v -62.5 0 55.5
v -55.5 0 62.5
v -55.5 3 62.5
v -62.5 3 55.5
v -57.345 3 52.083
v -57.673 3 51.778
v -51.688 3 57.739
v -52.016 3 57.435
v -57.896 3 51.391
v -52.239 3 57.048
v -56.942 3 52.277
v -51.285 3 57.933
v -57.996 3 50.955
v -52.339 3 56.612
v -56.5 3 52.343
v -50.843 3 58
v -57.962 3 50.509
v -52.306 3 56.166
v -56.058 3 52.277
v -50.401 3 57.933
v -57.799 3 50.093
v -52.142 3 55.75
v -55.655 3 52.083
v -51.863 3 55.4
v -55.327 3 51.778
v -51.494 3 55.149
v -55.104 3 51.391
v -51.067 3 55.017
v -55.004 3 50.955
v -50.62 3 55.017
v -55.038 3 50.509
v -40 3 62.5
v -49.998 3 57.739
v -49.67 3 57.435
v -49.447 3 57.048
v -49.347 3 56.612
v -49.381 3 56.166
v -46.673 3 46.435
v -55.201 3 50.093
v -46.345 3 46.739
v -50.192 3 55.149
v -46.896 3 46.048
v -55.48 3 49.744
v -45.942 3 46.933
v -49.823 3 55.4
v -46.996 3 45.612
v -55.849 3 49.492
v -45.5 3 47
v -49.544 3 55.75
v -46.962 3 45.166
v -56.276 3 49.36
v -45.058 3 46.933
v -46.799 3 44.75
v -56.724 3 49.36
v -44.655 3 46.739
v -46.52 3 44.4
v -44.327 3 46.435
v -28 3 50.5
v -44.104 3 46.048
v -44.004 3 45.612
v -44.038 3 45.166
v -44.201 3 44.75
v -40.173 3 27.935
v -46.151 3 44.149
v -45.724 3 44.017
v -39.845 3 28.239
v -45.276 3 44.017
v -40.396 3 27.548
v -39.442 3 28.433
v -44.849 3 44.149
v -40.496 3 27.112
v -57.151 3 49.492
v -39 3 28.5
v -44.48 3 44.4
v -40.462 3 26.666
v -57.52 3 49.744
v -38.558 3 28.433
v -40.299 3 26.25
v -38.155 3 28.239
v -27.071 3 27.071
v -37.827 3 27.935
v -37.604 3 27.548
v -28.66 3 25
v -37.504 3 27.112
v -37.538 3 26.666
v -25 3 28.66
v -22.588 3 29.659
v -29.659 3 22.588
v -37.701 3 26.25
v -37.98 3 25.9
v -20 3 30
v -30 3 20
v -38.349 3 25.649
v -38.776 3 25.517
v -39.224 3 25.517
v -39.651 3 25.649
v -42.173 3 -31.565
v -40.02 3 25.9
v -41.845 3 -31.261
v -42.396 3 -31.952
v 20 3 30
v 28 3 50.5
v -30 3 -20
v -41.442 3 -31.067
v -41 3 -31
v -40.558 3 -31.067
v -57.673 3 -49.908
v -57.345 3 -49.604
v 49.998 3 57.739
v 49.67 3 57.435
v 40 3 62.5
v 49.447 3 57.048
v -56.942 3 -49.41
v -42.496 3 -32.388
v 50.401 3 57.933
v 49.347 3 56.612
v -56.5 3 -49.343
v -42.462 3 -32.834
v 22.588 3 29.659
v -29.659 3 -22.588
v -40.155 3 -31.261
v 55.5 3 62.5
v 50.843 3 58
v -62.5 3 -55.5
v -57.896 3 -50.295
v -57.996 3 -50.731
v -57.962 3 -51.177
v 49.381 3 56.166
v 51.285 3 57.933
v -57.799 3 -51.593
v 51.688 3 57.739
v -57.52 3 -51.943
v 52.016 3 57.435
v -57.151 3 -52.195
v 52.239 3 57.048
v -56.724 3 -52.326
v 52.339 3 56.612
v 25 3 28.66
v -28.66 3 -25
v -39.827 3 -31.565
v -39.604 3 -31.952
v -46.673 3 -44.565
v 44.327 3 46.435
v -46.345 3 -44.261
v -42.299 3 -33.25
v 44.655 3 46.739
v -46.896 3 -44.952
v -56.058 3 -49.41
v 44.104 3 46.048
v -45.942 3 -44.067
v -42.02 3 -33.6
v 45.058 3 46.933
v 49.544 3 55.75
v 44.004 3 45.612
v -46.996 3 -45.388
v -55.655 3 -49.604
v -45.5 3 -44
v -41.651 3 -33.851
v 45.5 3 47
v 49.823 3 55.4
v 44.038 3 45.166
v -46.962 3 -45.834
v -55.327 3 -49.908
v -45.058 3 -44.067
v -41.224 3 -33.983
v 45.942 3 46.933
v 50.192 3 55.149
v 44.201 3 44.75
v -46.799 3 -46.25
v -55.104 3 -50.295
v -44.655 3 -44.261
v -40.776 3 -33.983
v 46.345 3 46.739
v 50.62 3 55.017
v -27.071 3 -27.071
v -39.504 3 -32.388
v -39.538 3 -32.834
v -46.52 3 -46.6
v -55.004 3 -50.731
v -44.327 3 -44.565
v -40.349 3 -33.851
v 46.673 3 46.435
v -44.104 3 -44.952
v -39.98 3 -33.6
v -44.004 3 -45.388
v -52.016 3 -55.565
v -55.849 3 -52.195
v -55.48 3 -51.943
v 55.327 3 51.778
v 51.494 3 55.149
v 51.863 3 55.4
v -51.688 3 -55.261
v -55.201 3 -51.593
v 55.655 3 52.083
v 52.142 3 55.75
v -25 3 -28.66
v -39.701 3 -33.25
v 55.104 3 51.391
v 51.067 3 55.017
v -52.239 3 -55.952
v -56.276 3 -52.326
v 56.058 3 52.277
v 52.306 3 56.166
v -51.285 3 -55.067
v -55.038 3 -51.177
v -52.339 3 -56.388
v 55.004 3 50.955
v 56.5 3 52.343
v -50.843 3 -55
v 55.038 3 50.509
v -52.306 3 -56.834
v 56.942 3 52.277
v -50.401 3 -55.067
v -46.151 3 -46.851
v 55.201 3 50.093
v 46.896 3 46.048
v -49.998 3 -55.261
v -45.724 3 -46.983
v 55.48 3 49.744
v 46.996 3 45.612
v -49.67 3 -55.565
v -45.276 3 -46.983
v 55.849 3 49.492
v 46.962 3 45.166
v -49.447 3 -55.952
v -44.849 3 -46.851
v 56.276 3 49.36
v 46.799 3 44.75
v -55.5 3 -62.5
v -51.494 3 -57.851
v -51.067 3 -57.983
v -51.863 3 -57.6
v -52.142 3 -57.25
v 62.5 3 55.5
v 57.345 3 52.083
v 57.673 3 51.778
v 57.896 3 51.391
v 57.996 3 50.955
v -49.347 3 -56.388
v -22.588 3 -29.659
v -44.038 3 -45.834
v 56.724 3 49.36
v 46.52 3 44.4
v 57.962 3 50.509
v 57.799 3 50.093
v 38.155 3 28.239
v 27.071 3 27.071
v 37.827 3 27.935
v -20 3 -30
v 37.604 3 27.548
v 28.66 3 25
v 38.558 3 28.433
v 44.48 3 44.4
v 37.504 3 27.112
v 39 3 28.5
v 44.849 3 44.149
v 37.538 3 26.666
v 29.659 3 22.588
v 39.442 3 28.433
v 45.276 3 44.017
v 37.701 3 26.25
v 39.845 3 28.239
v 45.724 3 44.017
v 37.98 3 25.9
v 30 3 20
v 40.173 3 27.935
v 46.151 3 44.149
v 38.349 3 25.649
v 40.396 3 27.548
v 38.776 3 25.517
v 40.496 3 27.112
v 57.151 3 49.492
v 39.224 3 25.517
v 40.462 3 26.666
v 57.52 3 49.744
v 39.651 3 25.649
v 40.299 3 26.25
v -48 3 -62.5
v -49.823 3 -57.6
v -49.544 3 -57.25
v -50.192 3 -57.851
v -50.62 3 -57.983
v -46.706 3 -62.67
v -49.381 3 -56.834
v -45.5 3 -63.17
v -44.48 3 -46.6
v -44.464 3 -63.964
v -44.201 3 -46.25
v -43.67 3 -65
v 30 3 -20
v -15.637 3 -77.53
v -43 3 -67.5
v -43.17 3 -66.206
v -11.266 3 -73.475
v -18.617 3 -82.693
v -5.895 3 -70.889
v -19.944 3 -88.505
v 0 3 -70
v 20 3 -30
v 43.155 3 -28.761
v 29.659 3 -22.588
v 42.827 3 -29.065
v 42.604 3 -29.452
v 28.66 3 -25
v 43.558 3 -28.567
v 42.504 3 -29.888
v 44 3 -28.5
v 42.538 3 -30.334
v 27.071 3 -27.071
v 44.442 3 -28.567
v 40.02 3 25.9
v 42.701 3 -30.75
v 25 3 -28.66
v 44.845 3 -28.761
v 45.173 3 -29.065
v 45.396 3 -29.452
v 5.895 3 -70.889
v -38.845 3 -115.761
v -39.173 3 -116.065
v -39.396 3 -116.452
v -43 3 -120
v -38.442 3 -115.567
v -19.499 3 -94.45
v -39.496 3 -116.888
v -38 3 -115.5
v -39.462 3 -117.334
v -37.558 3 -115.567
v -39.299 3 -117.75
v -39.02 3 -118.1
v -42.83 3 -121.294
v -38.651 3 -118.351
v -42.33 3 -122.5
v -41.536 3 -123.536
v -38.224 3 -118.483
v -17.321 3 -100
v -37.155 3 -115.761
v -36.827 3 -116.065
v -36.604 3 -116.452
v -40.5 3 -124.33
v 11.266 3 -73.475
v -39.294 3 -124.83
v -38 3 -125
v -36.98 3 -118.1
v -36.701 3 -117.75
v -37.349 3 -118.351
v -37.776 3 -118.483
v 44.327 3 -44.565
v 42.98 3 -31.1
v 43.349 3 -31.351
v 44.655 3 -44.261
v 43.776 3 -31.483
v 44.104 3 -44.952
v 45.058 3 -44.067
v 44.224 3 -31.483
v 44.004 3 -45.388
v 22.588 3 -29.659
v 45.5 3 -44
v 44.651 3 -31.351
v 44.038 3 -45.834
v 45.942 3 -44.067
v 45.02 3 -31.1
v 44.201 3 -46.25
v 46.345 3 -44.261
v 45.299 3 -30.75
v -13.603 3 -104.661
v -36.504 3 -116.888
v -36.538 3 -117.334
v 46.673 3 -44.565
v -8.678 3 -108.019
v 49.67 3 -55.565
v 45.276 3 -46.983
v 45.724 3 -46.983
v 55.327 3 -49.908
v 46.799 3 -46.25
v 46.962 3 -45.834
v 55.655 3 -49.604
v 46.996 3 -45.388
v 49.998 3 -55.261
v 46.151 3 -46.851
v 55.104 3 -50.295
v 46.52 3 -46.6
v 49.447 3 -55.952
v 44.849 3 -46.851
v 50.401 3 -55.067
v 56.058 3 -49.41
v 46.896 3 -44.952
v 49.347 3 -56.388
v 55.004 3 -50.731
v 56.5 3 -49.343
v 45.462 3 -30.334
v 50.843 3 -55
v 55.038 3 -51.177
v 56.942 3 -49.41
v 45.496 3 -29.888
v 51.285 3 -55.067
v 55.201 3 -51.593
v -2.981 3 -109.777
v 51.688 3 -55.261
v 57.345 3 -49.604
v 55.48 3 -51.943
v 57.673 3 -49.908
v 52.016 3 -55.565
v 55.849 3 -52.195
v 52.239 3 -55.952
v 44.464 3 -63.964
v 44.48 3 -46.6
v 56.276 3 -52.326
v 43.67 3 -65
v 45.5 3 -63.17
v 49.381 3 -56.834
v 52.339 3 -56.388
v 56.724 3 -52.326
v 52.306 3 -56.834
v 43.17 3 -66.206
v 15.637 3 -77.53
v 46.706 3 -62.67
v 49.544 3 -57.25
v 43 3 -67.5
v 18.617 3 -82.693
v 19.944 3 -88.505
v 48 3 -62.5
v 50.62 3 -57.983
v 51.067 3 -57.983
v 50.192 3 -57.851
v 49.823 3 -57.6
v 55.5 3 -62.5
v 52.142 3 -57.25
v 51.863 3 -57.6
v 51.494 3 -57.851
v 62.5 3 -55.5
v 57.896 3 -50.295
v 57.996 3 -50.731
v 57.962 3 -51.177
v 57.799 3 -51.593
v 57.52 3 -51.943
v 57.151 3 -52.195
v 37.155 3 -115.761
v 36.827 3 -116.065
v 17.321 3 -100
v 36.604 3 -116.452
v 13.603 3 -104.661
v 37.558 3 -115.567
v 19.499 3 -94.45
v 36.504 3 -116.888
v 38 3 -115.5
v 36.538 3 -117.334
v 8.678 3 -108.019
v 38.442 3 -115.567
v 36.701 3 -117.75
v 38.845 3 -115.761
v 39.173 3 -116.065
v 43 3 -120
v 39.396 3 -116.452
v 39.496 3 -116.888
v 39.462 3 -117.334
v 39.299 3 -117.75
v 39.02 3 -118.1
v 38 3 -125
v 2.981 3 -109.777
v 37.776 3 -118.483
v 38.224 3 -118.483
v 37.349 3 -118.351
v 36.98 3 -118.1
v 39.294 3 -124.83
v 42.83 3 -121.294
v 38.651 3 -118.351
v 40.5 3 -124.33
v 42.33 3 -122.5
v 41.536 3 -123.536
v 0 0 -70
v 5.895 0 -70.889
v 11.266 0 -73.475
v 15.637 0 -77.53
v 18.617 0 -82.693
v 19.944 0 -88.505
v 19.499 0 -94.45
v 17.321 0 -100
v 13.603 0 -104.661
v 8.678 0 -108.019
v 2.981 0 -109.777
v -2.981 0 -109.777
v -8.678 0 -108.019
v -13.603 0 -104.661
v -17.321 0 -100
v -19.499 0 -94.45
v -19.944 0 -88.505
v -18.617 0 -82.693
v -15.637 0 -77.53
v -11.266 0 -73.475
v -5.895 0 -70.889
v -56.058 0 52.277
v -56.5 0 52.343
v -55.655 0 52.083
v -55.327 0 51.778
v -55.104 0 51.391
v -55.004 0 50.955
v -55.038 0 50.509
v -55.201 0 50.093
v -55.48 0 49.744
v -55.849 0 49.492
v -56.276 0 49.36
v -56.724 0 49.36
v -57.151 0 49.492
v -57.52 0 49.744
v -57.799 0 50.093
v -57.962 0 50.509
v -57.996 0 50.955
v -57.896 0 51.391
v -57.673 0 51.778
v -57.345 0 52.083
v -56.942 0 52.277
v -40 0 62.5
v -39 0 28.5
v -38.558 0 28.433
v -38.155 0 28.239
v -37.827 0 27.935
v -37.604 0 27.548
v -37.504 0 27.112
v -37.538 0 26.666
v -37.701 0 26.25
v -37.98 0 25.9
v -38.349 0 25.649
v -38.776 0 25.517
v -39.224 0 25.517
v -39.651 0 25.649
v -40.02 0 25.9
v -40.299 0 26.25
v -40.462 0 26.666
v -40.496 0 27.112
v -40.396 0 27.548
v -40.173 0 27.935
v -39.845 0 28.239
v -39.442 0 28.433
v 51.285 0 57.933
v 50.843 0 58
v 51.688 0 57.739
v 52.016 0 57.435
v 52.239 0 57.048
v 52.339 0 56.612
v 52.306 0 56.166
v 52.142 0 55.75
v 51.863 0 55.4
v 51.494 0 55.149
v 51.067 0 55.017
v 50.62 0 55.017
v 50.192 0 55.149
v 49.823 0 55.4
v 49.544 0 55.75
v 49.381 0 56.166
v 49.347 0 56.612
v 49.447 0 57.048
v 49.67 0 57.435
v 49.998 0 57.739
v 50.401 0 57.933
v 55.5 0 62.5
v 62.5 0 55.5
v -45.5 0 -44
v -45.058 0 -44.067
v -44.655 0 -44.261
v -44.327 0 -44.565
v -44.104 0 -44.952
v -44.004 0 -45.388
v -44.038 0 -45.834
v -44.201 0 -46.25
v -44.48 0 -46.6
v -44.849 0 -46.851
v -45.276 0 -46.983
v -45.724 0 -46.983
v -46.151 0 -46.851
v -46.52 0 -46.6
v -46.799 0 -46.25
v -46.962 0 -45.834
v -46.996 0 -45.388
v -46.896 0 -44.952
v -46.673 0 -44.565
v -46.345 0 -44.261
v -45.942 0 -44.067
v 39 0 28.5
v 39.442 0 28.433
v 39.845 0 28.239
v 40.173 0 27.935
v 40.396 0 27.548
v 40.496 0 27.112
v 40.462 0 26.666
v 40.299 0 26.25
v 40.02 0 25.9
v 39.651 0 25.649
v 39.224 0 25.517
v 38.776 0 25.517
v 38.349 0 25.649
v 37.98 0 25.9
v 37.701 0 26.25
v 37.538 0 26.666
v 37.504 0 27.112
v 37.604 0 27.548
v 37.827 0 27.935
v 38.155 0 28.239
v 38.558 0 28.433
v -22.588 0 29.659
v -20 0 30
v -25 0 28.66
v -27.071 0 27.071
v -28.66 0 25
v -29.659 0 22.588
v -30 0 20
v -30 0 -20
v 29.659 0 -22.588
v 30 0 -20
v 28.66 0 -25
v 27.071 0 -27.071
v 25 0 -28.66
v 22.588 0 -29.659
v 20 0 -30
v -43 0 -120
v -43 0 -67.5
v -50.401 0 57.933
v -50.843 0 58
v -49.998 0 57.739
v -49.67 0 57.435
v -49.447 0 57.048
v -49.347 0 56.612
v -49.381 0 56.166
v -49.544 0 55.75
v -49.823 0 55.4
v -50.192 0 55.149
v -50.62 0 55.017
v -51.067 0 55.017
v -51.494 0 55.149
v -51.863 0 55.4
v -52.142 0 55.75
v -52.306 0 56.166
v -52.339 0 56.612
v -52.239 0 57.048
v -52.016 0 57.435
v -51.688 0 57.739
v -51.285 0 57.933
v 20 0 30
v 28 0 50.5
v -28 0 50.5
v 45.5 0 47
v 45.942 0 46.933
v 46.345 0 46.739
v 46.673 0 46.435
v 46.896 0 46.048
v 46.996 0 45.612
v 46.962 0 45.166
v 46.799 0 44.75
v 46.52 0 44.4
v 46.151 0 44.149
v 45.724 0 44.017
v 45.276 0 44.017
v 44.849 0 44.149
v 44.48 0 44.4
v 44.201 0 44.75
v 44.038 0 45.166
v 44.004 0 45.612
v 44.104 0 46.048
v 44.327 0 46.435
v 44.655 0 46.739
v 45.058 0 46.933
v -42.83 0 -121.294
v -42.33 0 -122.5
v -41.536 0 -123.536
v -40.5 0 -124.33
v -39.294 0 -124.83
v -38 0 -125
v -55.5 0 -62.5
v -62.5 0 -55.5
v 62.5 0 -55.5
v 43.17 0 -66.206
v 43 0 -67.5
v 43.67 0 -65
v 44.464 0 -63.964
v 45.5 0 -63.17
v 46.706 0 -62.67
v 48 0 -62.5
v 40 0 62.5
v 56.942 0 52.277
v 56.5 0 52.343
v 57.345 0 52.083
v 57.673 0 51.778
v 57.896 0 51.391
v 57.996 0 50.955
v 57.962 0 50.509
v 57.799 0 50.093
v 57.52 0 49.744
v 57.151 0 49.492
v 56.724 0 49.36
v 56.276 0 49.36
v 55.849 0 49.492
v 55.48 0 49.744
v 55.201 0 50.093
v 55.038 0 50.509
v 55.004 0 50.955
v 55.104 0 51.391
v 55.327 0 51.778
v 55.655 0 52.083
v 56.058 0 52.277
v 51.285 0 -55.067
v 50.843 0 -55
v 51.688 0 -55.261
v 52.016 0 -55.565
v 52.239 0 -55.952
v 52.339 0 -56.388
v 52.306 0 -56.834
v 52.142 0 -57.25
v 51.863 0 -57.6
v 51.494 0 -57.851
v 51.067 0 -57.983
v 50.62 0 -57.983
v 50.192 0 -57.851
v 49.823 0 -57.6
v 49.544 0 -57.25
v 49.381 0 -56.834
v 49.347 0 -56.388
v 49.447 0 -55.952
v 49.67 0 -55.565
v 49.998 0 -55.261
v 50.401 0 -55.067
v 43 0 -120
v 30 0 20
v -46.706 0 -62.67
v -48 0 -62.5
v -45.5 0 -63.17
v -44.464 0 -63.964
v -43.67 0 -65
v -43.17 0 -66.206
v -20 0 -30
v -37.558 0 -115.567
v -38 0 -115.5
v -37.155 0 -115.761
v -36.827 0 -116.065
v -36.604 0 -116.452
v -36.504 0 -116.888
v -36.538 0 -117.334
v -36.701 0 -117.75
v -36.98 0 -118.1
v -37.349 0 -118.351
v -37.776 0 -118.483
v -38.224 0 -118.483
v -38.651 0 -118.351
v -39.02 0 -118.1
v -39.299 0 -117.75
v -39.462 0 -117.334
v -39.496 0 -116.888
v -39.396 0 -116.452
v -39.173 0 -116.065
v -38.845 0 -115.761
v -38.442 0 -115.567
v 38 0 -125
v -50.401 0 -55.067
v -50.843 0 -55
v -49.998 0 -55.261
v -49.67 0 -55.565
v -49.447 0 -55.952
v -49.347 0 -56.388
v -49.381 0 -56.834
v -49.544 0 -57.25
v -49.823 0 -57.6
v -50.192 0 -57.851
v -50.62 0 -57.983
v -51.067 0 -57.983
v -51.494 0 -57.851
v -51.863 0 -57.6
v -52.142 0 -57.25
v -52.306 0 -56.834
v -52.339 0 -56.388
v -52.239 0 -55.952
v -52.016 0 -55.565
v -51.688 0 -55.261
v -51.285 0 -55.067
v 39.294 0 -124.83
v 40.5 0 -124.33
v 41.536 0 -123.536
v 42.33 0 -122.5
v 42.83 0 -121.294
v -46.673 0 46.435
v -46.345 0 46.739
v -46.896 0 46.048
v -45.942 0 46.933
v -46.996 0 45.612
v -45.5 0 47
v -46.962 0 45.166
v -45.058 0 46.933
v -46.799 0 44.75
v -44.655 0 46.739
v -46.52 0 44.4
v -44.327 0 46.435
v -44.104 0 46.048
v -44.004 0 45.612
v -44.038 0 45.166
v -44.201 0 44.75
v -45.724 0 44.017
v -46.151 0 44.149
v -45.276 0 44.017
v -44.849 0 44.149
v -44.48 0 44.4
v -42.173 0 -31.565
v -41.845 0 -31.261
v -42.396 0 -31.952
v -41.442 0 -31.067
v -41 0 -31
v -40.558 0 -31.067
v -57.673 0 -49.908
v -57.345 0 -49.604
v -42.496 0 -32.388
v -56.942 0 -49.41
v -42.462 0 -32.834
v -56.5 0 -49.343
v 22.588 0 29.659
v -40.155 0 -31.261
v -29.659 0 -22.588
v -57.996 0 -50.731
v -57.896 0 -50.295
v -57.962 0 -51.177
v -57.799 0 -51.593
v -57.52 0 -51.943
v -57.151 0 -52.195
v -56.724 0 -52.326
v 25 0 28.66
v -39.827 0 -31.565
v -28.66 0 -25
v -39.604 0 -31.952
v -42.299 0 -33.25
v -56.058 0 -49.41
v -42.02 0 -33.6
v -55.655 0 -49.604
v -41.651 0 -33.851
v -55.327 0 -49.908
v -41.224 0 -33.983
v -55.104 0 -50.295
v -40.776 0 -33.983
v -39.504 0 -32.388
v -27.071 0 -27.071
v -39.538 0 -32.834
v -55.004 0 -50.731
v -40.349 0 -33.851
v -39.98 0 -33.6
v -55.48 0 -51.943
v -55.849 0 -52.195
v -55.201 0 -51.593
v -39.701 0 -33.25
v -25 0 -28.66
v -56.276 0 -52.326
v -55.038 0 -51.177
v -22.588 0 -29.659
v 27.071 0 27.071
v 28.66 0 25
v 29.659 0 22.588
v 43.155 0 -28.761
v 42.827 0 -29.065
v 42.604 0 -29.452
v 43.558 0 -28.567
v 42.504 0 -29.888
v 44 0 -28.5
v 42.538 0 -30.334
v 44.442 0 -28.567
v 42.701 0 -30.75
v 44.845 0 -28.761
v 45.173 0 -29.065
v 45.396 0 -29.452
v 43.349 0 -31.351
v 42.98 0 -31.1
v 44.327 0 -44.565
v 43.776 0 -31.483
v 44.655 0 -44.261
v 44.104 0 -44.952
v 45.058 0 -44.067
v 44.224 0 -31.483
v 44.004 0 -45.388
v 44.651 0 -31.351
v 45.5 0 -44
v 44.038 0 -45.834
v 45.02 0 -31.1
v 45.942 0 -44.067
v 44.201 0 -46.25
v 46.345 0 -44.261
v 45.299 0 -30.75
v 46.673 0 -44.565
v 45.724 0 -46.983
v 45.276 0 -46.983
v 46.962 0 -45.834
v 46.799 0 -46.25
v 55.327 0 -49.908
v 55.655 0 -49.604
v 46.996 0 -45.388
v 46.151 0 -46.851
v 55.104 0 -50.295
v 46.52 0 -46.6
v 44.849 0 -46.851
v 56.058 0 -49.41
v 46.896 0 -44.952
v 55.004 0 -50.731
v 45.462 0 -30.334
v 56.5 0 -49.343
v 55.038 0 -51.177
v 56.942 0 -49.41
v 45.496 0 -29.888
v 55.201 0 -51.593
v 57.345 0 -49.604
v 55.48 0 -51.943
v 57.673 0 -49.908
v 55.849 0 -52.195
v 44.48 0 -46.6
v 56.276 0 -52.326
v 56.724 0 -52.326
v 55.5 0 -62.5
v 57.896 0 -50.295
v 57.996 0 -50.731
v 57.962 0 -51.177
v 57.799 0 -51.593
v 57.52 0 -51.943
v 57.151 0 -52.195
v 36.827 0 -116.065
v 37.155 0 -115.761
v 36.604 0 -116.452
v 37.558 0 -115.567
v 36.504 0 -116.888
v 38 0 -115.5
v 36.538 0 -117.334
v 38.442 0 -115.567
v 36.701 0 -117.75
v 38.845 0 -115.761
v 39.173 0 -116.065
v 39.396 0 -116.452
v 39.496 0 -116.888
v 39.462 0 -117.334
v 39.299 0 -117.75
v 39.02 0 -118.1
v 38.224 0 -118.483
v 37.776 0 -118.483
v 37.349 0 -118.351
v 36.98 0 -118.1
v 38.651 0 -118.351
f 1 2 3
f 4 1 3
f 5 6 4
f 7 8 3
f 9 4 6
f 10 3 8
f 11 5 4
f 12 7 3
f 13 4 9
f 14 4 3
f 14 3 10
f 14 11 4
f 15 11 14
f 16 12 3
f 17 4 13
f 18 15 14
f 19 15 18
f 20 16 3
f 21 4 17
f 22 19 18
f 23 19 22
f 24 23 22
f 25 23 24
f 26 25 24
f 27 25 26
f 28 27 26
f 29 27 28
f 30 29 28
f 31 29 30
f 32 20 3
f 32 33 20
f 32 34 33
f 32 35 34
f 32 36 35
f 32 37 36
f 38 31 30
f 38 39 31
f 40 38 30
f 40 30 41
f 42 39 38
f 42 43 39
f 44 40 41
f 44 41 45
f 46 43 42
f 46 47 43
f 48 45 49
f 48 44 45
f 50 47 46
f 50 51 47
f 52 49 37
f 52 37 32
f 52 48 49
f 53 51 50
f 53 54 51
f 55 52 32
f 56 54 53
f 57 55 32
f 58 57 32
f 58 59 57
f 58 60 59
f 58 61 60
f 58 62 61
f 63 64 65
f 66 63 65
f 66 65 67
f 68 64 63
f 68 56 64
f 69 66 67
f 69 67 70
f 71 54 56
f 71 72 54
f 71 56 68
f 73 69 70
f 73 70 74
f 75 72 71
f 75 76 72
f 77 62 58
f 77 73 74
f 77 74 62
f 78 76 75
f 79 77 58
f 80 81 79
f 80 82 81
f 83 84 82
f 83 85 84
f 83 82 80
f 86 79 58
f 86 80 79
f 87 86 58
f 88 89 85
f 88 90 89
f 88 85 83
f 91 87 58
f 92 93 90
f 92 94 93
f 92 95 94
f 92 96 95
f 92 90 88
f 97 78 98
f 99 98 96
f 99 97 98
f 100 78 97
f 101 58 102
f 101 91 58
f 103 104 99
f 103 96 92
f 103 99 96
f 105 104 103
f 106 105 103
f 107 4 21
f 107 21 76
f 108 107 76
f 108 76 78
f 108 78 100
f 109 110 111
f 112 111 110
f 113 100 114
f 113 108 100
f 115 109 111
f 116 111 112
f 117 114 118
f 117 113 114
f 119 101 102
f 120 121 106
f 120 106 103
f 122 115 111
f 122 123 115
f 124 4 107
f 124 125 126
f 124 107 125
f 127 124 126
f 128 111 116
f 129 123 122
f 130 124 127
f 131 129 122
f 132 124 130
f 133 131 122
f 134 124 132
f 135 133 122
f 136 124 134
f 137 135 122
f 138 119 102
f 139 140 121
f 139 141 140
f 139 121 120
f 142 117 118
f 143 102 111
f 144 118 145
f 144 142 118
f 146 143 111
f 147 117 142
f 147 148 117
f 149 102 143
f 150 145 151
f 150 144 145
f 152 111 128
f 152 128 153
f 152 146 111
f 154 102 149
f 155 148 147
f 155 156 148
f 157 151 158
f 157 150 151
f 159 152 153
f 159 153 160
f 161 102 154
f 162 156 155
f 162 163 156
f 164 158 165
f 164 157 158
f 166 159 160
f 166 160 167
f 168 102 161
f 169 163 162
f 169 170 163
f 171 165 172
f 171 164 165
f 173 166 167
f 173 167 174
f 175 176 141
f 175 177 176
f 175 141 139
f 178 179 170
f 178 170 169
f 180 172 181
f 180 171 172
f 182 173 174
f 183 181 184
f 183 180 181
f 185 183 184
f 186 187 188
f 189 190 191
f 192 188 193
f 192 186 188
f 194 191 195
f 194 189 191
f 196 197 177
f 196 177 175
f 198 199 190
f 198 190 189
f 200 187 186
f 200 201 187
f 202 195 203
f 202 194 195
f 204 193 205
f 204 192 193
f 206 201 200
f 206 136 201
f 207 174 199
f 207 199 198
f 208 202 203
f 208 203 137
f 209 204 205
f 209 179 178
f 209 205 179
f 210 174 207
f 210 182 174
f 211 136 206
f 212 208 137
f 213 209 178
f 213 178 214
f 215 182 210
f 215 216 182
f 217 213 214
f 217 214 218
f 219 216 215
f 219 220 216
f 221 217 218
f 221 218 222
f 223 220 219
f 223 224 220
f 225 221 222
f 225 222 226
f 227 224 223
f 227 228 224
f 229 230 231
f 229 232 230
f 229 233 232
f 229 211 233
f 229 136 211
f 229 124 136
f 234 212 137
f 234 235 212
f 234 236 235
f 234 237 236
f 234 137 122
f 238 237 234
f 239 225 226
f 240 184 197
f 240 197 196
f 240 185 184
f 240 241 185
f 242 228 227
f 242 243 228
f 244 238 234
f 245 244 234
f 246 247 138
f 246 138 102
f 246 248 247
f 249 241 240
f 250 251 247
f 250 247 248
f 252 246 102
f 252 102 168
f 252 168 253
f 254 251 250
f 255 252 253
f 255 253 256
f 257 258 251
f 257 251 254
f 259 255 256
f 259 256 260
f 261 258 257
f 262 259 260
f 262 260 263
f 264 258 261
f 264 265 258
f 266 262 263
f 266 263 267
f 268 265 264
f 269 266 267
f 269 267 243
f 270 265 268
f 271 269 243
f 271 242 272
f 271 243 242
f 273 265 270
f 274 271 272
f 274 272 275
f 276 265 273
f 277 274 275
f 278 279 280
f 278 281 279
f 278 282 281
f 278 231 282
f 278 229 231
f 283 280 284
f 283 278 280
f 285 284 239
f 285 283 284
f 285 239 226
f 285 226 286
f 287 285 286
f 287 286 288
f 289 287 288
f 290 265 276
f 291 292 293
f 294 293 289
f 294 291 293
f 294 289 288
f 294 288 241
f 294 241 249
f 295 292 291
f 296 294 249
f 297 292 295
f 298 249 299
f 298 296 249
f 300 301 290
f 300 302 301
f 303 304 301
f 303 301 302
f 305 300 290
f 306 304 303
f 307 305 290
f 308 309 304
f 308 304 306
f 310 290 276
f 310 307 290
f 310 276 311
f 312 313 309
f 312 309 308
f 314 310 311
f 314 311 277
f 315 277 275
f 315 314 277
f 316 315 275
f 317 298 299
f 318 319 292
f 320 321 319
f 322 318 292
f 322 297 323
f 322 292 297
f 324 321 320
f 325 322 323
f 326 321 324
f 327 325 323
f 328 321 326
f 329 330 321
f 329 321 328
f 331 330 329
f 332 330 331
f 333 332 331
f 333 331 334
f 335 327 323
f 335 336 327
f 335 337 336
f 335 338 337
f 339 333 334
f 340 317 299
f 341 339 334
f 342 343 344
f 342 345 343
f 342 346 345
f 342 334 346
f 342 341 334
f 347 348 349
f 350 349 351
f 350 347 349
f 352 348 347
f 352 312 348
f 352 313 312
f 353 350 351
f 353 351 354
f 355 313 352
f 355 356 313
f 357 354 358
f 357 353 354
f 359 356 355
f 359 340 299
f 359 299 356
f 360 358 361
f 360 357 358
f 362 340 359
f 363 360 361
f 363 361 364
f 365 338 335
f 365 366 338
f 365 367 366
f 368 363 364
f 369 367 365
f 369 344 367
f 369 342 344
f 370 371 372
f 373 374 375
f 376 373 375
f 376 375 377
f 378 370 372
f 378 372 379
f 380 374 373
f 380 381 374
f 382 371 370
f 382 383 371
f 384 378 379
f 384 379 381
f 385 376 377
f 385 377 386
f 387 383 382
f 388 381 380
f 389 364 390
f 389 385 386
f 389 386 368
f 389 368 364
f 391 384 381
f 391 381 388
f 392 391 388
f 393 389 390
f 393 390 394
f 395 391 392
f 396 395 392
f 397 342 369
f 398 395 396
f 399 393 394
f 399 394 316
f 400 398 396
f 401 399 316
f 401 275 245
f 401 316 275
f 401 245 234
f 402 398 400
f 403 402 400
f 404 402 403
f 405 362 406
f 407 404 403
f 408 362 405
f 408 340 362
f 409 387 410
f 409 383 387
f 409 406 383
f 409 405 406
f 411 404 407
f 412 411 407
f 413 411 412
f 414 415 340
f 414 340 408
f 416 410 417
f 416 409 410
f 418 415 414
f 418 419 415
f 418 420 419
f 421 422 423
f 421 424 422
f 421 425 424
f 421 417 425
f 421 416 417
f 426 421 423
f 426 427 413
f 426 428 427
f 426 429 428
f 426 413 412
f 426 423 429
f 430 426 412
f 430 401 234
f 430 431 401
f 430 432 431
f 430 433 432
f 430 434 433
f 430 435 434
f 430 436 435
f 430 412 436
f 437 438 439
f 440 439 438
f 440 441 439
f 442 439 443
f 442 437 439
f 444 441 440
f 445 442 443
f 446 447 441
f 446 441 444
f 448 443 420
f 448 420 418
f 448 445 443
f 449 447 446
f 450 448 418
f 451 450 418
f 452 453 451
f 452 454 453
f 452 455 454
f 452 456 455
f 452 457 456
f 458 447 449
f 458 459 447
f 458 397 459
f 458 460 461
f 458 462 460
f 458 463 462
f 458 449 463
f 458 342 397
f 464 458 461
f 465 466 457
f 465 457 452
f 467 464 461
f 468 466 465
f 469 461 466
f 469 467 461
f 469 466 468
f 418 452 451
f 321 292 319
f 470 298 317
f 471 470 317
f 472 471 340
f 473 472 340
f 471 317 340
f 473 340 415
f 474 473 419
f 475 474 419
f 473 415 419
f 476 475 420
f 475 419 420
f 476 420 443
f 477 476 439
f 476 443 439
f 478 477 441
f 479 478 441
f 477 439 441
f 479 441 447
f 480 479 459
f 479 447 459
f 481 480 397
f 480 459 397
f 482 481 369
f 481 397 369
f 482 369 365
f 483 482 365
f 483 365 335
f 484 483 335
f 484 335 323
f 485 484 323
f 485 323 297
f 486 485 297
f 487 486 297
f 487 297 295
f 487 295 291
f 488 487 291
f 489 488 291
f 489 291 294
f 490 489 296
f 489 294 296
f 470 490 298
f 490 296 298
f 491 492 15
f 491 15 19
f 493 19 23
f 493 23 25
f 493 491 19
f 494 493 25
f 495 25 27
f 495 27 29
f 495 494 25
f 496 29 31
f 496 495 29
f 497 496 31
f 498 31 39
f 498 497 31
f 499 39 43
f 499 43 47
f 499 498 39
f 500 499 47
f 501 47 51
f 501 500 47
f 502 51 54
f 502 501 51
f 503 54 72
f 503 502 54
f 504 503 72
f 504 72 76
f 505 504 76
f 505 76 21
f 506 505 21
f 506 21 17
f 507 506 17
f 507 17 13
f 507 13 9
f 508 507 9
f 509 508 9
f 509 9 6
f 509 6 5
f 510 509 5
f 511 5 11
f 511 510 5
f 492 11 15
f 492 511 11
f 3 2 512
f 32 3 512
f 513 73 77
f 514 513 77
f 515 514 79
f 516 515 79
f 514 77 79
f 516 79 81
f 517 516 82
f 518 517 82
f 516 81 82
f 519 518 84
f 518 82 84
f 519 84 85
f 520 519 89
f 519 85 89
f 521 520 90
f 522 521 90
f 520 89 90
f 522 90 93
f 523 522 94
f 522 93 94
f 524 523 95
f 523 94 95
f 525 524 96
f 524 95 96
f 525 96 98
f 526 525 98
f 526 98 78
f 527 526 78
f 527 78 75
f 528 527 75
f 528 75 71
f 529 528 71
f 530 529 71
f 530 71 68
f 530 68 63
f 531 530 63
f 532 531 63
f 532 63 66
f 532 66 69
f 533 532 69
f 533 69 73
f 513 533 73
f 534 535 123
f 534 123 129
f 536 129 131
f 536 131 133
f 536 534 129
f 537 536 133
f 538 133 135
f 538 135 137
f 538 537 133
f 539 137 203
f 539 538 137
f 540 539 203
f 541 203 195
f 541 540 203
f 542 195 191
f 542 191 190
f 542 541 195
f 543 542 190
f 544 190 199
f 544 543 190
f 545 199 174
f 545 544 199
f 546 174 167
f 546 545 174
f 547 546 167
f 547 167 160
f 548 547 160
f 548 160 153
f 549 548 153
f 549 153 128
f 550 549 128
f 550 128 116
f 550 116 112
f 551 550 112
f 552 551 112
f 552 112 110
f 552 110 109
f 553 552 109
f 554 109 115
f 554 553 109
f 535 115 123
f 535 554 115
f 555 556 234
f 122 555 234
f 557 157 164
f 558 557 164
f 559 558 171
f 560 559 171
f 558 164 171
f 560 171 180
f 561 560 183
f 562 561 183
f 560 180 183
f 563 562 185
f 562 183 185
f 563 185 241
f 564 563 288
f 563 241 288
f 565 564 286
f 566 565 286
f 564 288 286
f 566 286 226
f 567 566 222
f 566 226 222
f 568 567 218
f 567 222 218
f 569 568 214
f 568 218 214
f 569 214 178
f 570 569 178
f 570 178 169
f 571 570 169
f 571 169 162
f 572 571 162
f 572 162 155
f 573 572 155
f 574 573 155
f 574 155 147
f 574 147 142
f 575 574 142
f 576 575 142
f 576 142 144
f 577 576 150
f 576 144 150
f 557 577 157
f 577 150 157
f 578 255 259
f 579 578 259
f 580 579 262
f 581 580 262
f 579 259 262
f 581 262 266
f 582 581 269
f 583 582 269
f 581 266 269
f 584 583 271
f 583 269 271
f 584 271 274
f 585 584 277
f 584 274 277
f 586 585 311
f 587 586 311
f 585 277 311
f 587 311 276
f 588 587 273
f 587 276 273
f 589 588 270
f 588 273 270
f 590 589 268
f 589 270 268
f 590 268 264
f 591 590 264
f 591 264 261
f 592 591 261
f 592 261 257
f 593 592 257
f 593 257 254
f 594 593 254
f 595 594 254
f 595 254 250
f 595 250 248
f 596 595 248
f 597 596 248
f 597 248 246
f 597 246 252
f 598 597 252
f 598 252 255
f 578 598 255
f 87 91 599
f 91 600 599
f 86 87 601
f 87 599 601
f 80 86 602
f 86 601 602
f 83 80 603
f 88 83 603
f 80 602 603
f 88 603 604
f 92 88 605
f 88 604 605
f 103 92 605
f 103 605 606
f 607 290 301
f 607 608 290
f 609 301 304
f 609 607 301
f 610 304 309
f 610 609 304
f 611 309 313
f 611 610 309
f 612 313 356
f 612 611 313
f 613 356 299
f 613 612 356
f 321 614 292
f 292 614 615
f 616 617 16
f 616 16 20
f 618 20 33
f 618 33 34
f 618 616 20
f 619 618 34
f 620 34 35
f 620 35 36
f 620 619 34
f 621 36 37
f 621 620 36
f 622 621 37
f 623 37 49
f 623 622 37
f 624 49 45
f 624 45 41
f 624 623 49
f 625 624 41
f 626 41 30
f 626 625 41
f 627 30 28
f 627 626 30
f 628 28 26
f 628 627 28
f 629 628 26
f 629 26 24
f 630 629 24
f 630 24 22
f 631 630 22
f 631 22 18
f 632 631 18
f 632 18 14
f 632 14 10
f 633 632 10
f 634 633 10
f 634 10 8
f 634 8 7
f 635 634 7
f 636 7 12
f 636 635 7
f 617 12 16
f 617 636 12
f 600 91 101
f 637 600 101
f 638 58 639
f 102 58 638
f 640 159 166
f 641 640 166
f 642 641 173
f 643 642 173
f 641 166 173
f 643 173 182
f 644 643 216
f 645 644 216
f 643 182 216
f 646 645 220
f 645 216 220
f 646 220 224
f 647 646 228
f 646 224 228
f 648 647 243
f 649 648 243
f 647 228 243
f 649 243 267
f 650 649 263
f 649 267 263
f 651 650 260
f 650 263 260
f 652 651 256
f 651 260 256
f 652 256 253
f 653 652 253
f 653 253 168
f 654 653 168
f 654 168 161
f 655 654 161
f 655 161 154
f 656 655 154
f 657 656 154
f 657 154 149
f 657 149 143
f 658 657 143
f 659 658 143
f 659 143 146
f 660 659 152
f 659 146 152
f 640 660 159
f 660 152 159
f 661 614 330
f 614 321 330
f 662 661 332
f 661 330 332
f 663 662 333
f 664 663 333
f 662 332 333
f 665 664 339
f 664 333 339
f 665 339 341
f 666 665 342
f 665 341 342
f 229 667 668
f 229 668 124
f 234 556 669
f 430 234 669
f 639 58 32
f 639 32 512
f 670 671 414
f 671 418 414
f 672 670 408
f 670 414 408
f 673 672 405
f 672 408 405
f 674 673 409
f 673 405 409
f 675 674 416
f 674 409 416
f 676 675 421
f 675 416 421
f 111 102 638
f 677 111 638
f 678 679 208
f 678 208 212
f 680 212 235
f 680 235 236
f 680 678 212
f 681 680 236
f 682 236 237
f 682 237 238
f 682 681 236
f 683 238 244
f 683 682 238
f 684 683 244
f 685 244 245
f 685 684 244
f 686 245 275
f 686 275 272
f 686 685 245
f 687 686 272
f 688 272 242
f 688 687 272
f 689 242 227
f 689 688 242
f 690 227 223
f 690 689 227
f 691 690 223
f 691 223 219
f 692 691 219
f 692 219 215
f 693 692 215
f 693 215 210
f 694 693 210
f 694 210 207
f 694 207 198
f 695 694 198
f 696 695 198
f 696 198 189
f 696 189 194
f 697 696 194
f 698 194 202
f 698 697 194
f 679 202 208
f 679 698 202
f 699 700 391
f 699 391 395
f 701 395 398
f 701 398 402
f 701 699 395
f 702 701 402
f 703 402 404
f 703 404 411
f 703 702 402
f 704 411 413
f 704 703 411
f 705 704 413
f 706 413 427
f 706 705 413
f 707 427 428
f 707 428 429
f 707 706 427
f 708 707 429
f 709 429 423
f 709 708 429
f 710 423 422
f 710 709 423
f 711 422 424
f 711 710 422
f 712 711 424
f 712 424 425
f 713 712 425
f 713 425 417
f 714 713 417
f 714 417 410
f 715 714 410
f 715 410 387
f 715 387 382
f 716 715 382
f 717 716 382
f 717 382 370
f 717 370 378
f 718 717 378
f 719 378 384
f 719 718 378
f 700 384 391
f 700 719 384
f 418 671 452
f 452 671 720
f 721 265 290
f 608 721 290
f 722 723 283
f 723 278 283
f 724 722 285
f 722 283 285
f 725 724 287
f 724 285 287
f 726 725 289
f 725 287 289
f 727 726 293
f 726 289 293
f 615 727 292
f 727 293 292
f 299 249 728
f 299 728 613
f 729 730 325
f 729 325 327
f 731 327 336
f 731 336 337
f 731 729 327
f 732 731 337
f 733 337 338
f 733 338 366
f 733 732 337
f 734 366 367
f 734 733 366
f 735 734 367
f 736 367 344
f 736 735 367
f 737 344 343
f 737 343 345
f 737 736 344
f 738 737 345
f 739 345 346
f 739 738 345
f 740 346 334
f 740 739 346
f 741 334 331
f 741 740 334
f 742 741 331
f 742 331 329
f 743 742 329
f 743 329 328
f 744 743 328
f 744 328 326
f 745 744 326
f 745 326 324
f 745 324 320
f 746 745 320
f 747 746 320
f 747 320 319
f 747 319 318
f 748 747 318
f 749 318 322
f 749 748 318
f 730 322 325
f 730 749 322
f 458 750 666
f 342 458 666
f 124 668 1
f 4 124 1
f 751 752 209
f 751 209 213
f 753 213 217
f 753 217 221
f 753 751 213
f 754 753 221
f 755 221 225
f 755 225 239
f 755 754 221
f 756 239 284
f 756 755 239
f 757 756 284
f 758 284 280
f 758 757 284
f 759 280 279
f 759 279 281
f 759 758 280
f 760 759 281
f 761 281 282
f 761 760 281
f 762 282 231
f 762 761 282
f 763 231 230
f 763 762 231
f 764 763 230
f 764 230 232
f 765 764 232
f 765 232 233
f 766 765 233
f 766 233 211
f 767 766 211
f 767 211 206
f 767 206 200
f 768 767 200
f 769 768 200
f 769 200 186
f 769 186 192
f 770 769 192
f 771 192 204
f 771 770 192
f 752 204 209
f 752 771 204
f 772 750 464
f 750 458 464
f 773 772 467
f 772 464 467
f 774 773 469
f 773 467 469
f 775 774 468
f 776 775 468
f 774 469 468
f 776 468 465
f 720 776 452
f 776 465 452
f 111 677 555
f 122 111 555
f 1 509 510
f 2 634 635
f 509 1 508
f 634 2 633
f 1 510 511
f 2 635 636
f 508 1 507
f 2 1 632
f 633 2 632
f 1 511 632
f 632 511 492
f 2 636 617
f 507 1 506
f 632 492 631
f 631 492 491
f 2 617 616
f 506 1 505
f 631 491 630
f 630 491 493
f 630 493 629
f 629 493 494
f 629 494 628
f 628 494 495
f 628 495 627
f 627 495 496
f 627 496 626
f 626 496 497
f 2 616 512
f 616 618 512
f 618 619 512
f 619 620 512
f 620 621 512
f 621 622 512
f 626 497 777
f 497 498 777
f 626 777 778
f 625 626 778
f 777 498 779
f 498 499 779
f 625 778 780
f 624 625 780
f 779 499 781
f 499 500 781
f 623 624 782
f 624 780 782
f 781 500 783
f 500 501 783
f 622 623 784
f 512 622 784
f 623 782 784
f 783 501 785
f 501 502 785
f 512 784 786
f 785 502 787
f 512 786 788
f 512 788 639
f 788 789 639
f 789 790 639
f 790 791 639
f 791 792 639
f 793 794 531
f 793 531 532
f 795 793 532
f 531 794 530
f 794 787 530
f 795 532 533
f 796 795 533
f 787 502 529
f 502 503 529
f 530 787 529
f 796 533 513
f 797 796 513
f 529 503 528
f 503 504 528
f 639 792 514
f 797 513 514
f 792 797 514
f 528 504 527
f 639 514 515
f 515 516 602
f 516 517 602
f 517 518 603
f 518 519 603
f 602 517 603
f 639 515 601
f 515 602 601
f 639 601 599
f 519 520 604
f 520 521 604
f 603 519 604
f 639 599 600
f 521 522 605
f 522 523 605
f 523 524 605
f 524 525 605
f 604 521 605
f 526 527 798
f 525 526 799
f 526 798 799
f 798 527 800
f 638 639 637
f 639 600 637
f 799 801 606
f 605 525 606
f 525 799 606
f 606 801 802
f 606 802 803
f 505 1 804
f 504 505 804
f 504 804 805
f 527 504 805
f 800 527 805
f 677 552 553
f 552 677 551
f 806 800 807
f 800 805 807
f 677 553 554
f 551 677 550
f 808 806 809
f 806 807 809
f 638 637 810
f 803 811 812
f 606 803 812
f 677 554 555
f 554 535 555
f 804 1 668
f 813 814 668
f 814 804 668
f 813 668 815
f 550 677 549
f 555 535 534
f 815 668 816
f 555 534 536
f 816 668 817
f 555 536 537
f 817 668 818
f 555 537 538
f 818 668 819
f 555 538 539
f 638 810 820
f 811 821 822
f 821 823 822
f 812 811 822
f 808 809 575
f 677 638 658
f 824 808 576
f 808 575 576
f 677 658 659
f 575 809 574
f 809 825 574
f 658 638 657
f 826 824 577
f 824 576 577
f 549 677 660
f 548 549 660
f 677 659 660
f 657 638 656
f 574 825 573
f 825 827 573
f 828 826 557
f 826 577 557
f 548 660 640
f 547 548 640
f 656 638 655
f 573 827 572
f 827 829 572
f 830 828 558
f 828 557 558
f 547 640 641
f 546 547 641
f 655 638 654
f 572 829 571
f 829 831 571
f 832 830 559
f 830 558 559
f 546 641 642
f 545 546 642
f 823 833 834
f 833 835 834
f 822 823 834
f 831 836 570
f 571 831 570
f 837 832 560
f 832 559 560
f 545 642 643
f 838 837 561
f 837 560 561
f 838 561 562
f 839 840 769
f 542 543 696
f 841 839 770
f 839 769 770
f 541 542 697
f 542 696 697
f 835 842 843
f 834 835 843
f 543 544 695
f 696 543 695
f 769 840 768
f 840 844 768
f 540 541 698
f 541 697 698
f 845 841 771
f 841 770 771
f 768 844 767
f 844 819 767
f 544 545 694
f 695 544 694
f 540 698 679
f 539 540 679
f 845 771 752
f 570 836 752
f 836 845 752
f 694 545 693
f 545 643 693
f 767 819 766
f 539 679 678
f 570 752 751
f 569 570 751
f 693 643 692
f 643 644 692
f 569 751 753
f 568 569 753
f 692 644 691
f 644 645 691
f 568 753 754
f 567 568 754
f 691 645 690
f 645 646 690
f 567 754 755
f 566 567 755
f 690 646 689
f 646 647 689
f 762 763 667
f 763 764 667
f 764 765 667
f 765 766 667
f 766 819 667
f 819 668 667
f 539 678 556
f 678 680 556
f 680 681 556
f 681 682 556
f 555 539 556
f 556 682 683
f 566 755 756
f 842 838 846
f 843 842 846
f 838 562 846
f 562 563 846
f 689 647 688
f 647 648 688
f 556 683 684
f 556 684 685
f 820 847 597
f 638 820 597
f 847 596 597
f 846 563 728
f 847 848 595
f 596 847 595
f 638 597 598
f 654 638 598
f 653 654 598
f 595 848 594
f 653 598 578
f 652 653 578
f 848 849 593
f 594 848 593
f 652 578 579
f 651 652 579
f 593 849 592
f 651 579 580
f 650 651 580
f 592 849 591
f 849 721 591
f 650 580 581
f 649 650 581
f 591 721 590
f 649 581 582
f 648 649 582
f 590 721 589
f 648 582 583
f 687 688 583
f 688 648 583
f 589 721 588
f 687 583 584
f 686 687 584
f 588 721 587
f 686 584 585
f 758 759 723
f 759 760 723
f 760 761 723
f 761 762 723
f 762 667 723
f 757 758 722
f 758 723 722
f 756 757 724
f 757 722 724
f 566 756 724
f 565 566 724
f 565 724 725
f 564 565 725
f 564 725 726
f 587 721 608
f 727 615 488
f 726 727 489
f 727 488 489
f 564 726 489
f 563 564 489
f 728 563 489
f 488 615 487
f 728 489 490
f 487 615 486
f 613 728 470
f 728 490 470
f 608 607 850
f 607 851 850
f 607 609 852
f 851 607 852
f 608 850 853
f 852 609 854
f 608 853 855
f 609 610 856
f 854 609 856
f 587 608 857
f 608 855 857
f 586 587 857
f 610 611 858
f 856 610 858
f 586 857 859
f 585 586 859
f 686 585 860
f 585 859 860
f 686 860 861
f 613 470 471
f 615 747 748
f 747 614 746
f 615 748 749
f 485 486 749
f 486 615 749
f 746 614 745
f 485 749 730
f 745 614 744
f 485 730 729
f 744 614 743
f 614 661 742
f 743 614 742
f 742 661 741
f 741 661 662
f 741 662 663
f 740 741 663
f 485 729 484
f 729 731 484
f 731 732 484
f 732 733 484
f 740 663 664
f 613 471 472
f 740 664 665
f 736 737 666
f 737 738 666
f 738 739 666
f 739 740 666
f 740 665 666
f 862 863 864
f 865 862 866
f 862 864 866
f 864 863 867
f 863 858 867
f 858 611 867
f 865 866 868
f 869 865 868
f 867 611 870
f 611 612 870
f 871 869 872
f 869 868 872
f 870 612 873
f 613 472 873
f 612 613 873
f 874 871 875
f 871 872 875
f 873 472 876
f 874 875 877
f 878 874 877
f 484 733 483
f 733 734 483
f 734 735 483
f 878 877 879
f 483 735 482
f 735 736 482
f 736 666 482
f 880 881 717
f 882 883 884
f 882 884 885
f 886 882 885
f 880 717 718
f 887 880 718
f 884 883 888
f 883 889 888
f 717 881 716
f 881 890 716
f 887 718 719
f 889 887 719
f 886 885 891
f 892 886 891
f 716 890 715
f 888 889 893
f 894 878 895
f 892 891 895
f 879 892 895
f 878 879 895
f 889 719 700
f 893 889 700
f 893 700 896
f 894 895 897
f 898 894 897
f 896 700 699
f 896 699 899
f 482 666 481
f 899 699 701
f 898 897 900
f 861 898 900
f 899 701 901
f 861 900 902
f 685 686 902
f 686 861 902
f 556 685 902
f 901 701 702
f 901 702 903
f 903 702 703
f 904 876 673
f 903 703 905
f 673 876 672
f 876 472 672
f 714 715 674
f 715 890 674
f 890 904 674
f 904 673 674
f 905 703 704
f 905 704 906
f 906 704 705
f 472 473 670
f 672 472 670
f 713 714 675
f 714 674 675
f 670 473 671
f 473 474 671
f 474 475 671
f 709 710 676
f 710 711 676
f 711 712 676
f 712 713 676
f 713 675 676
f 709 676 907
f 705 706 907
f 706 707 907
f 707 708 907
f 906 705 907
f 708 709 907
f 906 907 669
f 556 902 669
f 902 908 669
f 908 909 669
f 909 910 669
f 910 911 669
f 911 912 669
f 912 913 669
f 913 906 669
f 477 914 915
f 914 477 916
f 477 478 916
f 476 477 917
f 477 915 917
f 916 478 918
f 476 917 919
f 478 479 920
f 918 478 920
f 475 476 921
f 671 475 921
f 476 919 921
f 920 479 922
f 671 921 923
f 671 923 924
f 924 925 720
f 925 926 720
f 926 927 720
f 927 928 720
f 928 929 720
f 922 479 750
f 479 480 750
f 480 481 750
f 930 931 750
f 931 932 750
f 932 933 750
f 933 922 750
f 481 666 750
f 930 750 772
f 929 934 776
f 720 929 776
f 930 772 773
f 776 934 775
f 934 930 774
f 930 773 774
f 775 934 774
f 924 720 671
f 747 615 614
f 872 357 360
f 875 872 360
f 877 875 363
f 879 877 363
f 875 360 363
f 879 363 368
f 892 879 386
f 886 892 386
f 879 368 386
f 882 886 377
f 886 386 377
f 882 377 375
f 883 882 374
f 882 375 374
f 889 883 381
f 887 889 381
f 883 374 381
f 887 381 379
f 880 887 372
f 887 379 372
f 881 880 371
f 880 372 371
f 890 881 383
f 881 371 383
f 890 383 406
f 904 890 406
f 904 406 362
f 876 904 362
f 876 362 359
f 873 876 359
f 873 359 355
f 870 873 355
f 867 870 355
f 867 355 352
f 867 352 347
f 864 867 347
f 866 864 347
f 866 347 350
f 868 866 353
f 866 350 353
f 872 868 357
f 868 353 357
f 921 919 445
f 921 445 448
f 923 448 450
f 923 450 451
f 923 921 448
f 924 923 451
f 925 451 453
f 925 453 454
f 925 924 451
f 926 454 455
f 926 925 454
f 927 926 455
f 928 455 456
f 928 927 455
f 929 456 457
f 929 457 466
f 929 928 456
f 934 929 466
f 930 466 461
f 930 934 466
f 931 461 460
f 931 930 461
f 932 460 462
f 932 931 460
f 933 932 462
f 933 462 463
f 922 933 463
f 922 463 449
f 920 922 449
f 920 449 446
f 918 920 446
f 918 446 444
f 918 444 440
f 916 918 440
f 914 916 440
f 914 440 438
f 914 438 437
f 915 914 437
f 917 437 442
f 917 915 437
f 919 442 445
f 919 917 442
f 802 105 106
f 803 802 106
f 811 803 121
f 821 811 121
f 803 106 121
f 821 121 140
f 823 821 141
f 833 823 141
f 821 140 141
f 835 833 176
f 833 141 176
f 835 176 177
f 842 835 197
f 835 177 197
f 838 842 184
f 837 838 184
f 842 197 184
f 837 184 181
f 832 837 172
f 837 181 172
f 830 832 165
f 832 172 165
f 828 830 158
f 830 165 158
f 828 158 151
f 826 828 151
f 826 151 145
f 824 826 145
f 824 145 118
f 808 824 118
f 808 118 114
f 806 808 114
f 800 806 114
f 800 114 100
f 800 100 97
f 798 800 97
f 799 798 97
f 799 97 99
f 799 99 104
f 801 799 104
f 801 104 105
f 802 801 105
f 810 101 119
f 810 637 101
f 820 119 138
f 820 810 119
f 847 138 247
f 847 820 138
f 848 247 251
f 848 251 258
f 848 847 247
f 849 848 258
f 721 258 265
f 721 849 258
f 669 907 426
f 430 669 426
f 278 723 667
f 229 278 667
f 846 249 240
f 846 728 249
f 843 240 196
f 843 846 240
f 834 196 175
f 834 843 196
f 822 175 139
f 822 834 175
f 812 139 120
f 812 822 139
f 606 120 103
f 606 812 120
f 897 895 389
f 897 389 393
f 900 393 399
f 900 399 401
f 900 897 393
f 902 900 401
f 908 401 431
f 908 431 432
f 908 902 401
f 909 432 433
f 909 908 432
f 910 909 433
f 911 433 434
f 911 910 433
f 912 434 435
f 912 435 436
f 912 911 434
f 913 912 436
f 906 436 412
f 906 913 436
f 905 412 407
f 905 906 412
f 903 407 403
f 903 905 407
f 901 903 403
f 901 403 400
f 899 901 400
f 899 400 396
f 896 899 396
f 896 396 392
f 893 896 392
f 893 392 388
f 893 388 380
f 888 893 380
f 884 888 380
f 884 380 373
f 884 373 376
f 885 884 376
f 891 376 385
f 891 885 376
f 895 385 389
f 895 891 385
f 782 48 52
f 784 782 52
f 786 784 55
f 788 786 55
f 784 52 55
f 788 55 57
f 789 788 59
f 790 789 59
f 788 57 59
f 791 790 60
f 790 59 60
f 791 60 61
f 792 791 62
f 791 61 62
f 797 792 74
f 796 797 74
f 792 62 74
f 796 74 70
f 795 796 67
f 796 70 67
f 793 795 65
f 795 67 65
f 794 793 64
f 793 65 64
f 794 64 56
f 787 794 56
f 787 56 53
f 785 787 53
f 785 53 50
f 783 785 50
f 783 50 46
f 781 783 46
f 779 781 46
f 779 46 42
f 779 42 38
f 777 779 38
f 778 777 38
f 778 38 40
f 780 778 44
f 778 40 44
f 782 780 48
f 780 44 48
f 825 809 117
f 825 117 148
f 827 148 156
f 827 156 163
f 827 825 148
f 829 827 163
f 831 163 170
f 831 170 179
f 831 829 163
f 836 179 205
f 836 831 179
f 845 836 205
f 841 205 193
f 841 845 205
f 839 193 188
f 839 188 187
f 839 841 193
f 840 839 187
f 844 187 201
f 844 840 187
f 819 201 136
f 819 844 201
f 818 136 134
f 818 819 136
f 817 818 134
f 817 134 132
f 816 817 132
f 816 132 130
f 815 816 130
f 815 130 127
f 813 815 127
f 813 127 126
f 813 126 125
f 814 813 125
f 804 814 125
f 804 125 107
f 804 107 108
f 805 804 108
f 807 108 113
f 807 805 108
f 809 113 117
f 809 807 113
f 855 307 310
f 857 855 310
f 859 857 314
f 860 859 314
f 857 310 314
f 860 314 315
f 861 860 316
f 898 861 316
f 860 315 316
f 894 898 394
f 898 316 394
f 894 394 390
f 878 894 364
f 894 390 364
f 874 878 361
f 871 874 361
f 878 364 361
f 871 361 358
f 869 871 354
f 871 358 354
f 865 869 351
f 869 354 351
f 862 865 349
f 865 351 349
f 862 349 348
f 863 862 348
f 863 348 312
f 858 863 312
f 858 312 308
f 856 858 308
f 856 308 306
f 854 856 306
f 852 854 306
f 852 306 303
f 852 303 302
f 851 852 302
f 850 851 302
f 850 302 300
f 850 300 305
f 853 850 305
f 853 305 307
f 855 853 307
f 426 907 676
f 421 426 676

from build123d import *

# Parameters (mm, degrees)
SKETCH_1_R          = 1.5
EXTRUDE_1_DEPTH     = 3
CHAMFER_1_SIZE      = 7
FILLET_1_R          = 5
SKETCH_3_W          = 60
SKETCH_3_H          = 60
SKETCH_3_R          = 1.5
SKETCH_3_R_2        = 20
SKETCH_3_W_2        = 80
SKETCH_3_H_2        = 12
CUT_EXTRUDE_1_DEPTH = 3
FILLET_3_R          = 10
CHAMFER_2_SIZE      = 12
SKETCH_4_R          = 1.5
CUT_EXTRUDE_2_DEPTH = 10


with BuildPart() as part:
    # 草图1 → 凸台-拉伸1 (new body)
    with BuildSketch(Plane(origin=(0, 0, 0), x_dir=(1, 0, 0), z_dir=(0, 1, 0))):
        Polygon((-62.5, 62.5), (-62.5, -62.5), (62.5, -62.5), (62.5, 62.5), (43, 62.5), (43, 125), (-43, 125), (-43, 62.5), align=None)
        with Locations(Location((-56.5, -50.843145751, 0), (0, 0, 270))):
            Circle(SKETCH_1_R, mode=Mode.SUBTRACT)
        with Locations(Location((-50.843145751, -56.5, 0), (0, 0, 270))):
            Circle(SKETCH_1_R, mode=Mode.SUBTRACT)
        with Locations(Location((50.843145751, -56.5, 0), (0, 0, 270))):
            Circle(SKETCH_1_R, mode=Mode.SUBTRACT)
        with Locations(Location((56.5, -50.843145751, 0), (0, 0, 270))):
            Circle(SKETCH_1_R, mode=Mode.SUBTRACT)
        with Locations(Location((-56.5, 50.843145751, 0), (0, 0, 270))):
            Circle(SKETCH_1_R, mode=Mode.SUBTRACT)
        with Locations(Location((-50.843145751, 56.5, 0), (0, 0, 270))):
            Circle(SKETCH_1_R, mode=Mode.SUBTRACT)
        with Locations(Location((56.5, 50.843145751, 0), (0, 0, 270))):
            Circle(SKETCH_1_R, mode=Mode.SUBTRACT)
        with Locations(Location((50.843145751, 56.5, 0), (0, 0, 270))):
            Circle(SKETCH_1_R, mode=Mode.SUBTRACT)
        with Locations(Location((38, 117, 0), (0, 0, 270))):
            Circle(SKETCH_1_R, mode=Mode.SUBTRACT)
        with Locations(Location((-38, 117, 0), (0, 0, 270))):
            Circle(SKETCH_1_R, mode=Mode.SUBTRACT)
    extrude(amount=EXTRUDE_1_DEPTH)

    # 倒角1
    chamfer_1_edges = [part.edges().sort_by_distance(p)[0] for p in [
        (-62.5, 1.5, 62.5),
        (-62.5, 1.5, -62.5),
        (62.5, 1.5, -62.5),
        (62.5, 1.5, 62.5),
    ]]
    chamfer(chamfer_1_edges, length=CHAMFER_1_SIZE)

    # 圆角1
    fillet_1_edges = [part.edges().sort_by_distance(p)[0] for p in [
        (-43, 1.5, -62.5),
        (-43, 1.5, -125),
        (43, 1.5, -125),
        (43, 1.5, -62.5),
    ]]
    fillet(fillet_1_edges, radius=FILLET_1_R)

    # 草图3 → 切除-拉伸1 (cut)
    with BuildSketch(Plane(origin=(0, 3, 0), x_dir=(1, 0, 0), z_dir=(0, 1, 0))):
        Rectangle(SKETCH_3_W, SKETCH_3_H)
        with Locations(Location((-45.5, 45.5, 0), (0, 0, 270))):
            Circle(SKETCH_3_R)
        with Locations(Location((45.5, 45.5, 0), (0, 0, 270))):
            Circle(SKETCH_3_R)
        with Locations(Location((45.5, -45.5, 0), (0, 0, 270))):
            Circle(SKETCH_3_R)
        with Locations(Location((-45.5, -45.5, 0), (0, 0, 270))):
            Circle(SKETCH_3_R)
        with Locations(Location((0, 90, 0), (0, 0, 270))):
            Circle(SKETCH_3_R_2)
        with Locations((0, -56.5)):
            Rectangle(SKETCH_3_W_2, SKETCH_3_H_2)
    extrude(amount=-CUT_EXTRUDE_1_DEPTH, mode=Mode.SUBTRACT)

    # 圆角3
    fillet_3_edges = [part.edges().sort_by_distance(p)[0] for p in [
        (30, 1.5, 30),
        (-30, 1.5, 30),
        (-30, 1.5, -30),
        (30, 1.5, -30),
    ]]
    fillet(fillet_3_edges, radius=FILLET_3_R)

    # 倒角2
    chamfer_2_edges = [part.edges().sort_by_distance(p)[0] for p in [
        (40, 1.5, 50.5),
        (-40, 1.5, 50.5),
    ]]
    chamfer(chamfer_2_edges, length=CHAMFER_2_SIZE - 0.0001)  # a hair under: the kernel refuses the full size

    # 草图4 → 切除-拉伸2 (cut)
    with BuildSketch(Plane(origin=(0, 3, 0), x_dir=(1, 0, 0), z_dir=(0, 1, 0))):
        with Locations(Location((-41, 32.5, 0), (0, 0, 270))):
            Circle(SKETCH_4_R)
        with Locations(Location((44, 30, 0), (0, 0, 270))):
            Circle(SKETCH_4_R)
        with Locations(Location((-39, -27, 0), (0, 0, 270))):
            Circle(SKETCH_4_R)
        with Locations(Location((39, -27, 0), (0, 0, 270))):
            Circle(SKETCH_4_R)
    extrude(amount=-CUT_EXTRUDE_2_DEPTH, mode=Mode.SUBTRACT)


solid = part.part
